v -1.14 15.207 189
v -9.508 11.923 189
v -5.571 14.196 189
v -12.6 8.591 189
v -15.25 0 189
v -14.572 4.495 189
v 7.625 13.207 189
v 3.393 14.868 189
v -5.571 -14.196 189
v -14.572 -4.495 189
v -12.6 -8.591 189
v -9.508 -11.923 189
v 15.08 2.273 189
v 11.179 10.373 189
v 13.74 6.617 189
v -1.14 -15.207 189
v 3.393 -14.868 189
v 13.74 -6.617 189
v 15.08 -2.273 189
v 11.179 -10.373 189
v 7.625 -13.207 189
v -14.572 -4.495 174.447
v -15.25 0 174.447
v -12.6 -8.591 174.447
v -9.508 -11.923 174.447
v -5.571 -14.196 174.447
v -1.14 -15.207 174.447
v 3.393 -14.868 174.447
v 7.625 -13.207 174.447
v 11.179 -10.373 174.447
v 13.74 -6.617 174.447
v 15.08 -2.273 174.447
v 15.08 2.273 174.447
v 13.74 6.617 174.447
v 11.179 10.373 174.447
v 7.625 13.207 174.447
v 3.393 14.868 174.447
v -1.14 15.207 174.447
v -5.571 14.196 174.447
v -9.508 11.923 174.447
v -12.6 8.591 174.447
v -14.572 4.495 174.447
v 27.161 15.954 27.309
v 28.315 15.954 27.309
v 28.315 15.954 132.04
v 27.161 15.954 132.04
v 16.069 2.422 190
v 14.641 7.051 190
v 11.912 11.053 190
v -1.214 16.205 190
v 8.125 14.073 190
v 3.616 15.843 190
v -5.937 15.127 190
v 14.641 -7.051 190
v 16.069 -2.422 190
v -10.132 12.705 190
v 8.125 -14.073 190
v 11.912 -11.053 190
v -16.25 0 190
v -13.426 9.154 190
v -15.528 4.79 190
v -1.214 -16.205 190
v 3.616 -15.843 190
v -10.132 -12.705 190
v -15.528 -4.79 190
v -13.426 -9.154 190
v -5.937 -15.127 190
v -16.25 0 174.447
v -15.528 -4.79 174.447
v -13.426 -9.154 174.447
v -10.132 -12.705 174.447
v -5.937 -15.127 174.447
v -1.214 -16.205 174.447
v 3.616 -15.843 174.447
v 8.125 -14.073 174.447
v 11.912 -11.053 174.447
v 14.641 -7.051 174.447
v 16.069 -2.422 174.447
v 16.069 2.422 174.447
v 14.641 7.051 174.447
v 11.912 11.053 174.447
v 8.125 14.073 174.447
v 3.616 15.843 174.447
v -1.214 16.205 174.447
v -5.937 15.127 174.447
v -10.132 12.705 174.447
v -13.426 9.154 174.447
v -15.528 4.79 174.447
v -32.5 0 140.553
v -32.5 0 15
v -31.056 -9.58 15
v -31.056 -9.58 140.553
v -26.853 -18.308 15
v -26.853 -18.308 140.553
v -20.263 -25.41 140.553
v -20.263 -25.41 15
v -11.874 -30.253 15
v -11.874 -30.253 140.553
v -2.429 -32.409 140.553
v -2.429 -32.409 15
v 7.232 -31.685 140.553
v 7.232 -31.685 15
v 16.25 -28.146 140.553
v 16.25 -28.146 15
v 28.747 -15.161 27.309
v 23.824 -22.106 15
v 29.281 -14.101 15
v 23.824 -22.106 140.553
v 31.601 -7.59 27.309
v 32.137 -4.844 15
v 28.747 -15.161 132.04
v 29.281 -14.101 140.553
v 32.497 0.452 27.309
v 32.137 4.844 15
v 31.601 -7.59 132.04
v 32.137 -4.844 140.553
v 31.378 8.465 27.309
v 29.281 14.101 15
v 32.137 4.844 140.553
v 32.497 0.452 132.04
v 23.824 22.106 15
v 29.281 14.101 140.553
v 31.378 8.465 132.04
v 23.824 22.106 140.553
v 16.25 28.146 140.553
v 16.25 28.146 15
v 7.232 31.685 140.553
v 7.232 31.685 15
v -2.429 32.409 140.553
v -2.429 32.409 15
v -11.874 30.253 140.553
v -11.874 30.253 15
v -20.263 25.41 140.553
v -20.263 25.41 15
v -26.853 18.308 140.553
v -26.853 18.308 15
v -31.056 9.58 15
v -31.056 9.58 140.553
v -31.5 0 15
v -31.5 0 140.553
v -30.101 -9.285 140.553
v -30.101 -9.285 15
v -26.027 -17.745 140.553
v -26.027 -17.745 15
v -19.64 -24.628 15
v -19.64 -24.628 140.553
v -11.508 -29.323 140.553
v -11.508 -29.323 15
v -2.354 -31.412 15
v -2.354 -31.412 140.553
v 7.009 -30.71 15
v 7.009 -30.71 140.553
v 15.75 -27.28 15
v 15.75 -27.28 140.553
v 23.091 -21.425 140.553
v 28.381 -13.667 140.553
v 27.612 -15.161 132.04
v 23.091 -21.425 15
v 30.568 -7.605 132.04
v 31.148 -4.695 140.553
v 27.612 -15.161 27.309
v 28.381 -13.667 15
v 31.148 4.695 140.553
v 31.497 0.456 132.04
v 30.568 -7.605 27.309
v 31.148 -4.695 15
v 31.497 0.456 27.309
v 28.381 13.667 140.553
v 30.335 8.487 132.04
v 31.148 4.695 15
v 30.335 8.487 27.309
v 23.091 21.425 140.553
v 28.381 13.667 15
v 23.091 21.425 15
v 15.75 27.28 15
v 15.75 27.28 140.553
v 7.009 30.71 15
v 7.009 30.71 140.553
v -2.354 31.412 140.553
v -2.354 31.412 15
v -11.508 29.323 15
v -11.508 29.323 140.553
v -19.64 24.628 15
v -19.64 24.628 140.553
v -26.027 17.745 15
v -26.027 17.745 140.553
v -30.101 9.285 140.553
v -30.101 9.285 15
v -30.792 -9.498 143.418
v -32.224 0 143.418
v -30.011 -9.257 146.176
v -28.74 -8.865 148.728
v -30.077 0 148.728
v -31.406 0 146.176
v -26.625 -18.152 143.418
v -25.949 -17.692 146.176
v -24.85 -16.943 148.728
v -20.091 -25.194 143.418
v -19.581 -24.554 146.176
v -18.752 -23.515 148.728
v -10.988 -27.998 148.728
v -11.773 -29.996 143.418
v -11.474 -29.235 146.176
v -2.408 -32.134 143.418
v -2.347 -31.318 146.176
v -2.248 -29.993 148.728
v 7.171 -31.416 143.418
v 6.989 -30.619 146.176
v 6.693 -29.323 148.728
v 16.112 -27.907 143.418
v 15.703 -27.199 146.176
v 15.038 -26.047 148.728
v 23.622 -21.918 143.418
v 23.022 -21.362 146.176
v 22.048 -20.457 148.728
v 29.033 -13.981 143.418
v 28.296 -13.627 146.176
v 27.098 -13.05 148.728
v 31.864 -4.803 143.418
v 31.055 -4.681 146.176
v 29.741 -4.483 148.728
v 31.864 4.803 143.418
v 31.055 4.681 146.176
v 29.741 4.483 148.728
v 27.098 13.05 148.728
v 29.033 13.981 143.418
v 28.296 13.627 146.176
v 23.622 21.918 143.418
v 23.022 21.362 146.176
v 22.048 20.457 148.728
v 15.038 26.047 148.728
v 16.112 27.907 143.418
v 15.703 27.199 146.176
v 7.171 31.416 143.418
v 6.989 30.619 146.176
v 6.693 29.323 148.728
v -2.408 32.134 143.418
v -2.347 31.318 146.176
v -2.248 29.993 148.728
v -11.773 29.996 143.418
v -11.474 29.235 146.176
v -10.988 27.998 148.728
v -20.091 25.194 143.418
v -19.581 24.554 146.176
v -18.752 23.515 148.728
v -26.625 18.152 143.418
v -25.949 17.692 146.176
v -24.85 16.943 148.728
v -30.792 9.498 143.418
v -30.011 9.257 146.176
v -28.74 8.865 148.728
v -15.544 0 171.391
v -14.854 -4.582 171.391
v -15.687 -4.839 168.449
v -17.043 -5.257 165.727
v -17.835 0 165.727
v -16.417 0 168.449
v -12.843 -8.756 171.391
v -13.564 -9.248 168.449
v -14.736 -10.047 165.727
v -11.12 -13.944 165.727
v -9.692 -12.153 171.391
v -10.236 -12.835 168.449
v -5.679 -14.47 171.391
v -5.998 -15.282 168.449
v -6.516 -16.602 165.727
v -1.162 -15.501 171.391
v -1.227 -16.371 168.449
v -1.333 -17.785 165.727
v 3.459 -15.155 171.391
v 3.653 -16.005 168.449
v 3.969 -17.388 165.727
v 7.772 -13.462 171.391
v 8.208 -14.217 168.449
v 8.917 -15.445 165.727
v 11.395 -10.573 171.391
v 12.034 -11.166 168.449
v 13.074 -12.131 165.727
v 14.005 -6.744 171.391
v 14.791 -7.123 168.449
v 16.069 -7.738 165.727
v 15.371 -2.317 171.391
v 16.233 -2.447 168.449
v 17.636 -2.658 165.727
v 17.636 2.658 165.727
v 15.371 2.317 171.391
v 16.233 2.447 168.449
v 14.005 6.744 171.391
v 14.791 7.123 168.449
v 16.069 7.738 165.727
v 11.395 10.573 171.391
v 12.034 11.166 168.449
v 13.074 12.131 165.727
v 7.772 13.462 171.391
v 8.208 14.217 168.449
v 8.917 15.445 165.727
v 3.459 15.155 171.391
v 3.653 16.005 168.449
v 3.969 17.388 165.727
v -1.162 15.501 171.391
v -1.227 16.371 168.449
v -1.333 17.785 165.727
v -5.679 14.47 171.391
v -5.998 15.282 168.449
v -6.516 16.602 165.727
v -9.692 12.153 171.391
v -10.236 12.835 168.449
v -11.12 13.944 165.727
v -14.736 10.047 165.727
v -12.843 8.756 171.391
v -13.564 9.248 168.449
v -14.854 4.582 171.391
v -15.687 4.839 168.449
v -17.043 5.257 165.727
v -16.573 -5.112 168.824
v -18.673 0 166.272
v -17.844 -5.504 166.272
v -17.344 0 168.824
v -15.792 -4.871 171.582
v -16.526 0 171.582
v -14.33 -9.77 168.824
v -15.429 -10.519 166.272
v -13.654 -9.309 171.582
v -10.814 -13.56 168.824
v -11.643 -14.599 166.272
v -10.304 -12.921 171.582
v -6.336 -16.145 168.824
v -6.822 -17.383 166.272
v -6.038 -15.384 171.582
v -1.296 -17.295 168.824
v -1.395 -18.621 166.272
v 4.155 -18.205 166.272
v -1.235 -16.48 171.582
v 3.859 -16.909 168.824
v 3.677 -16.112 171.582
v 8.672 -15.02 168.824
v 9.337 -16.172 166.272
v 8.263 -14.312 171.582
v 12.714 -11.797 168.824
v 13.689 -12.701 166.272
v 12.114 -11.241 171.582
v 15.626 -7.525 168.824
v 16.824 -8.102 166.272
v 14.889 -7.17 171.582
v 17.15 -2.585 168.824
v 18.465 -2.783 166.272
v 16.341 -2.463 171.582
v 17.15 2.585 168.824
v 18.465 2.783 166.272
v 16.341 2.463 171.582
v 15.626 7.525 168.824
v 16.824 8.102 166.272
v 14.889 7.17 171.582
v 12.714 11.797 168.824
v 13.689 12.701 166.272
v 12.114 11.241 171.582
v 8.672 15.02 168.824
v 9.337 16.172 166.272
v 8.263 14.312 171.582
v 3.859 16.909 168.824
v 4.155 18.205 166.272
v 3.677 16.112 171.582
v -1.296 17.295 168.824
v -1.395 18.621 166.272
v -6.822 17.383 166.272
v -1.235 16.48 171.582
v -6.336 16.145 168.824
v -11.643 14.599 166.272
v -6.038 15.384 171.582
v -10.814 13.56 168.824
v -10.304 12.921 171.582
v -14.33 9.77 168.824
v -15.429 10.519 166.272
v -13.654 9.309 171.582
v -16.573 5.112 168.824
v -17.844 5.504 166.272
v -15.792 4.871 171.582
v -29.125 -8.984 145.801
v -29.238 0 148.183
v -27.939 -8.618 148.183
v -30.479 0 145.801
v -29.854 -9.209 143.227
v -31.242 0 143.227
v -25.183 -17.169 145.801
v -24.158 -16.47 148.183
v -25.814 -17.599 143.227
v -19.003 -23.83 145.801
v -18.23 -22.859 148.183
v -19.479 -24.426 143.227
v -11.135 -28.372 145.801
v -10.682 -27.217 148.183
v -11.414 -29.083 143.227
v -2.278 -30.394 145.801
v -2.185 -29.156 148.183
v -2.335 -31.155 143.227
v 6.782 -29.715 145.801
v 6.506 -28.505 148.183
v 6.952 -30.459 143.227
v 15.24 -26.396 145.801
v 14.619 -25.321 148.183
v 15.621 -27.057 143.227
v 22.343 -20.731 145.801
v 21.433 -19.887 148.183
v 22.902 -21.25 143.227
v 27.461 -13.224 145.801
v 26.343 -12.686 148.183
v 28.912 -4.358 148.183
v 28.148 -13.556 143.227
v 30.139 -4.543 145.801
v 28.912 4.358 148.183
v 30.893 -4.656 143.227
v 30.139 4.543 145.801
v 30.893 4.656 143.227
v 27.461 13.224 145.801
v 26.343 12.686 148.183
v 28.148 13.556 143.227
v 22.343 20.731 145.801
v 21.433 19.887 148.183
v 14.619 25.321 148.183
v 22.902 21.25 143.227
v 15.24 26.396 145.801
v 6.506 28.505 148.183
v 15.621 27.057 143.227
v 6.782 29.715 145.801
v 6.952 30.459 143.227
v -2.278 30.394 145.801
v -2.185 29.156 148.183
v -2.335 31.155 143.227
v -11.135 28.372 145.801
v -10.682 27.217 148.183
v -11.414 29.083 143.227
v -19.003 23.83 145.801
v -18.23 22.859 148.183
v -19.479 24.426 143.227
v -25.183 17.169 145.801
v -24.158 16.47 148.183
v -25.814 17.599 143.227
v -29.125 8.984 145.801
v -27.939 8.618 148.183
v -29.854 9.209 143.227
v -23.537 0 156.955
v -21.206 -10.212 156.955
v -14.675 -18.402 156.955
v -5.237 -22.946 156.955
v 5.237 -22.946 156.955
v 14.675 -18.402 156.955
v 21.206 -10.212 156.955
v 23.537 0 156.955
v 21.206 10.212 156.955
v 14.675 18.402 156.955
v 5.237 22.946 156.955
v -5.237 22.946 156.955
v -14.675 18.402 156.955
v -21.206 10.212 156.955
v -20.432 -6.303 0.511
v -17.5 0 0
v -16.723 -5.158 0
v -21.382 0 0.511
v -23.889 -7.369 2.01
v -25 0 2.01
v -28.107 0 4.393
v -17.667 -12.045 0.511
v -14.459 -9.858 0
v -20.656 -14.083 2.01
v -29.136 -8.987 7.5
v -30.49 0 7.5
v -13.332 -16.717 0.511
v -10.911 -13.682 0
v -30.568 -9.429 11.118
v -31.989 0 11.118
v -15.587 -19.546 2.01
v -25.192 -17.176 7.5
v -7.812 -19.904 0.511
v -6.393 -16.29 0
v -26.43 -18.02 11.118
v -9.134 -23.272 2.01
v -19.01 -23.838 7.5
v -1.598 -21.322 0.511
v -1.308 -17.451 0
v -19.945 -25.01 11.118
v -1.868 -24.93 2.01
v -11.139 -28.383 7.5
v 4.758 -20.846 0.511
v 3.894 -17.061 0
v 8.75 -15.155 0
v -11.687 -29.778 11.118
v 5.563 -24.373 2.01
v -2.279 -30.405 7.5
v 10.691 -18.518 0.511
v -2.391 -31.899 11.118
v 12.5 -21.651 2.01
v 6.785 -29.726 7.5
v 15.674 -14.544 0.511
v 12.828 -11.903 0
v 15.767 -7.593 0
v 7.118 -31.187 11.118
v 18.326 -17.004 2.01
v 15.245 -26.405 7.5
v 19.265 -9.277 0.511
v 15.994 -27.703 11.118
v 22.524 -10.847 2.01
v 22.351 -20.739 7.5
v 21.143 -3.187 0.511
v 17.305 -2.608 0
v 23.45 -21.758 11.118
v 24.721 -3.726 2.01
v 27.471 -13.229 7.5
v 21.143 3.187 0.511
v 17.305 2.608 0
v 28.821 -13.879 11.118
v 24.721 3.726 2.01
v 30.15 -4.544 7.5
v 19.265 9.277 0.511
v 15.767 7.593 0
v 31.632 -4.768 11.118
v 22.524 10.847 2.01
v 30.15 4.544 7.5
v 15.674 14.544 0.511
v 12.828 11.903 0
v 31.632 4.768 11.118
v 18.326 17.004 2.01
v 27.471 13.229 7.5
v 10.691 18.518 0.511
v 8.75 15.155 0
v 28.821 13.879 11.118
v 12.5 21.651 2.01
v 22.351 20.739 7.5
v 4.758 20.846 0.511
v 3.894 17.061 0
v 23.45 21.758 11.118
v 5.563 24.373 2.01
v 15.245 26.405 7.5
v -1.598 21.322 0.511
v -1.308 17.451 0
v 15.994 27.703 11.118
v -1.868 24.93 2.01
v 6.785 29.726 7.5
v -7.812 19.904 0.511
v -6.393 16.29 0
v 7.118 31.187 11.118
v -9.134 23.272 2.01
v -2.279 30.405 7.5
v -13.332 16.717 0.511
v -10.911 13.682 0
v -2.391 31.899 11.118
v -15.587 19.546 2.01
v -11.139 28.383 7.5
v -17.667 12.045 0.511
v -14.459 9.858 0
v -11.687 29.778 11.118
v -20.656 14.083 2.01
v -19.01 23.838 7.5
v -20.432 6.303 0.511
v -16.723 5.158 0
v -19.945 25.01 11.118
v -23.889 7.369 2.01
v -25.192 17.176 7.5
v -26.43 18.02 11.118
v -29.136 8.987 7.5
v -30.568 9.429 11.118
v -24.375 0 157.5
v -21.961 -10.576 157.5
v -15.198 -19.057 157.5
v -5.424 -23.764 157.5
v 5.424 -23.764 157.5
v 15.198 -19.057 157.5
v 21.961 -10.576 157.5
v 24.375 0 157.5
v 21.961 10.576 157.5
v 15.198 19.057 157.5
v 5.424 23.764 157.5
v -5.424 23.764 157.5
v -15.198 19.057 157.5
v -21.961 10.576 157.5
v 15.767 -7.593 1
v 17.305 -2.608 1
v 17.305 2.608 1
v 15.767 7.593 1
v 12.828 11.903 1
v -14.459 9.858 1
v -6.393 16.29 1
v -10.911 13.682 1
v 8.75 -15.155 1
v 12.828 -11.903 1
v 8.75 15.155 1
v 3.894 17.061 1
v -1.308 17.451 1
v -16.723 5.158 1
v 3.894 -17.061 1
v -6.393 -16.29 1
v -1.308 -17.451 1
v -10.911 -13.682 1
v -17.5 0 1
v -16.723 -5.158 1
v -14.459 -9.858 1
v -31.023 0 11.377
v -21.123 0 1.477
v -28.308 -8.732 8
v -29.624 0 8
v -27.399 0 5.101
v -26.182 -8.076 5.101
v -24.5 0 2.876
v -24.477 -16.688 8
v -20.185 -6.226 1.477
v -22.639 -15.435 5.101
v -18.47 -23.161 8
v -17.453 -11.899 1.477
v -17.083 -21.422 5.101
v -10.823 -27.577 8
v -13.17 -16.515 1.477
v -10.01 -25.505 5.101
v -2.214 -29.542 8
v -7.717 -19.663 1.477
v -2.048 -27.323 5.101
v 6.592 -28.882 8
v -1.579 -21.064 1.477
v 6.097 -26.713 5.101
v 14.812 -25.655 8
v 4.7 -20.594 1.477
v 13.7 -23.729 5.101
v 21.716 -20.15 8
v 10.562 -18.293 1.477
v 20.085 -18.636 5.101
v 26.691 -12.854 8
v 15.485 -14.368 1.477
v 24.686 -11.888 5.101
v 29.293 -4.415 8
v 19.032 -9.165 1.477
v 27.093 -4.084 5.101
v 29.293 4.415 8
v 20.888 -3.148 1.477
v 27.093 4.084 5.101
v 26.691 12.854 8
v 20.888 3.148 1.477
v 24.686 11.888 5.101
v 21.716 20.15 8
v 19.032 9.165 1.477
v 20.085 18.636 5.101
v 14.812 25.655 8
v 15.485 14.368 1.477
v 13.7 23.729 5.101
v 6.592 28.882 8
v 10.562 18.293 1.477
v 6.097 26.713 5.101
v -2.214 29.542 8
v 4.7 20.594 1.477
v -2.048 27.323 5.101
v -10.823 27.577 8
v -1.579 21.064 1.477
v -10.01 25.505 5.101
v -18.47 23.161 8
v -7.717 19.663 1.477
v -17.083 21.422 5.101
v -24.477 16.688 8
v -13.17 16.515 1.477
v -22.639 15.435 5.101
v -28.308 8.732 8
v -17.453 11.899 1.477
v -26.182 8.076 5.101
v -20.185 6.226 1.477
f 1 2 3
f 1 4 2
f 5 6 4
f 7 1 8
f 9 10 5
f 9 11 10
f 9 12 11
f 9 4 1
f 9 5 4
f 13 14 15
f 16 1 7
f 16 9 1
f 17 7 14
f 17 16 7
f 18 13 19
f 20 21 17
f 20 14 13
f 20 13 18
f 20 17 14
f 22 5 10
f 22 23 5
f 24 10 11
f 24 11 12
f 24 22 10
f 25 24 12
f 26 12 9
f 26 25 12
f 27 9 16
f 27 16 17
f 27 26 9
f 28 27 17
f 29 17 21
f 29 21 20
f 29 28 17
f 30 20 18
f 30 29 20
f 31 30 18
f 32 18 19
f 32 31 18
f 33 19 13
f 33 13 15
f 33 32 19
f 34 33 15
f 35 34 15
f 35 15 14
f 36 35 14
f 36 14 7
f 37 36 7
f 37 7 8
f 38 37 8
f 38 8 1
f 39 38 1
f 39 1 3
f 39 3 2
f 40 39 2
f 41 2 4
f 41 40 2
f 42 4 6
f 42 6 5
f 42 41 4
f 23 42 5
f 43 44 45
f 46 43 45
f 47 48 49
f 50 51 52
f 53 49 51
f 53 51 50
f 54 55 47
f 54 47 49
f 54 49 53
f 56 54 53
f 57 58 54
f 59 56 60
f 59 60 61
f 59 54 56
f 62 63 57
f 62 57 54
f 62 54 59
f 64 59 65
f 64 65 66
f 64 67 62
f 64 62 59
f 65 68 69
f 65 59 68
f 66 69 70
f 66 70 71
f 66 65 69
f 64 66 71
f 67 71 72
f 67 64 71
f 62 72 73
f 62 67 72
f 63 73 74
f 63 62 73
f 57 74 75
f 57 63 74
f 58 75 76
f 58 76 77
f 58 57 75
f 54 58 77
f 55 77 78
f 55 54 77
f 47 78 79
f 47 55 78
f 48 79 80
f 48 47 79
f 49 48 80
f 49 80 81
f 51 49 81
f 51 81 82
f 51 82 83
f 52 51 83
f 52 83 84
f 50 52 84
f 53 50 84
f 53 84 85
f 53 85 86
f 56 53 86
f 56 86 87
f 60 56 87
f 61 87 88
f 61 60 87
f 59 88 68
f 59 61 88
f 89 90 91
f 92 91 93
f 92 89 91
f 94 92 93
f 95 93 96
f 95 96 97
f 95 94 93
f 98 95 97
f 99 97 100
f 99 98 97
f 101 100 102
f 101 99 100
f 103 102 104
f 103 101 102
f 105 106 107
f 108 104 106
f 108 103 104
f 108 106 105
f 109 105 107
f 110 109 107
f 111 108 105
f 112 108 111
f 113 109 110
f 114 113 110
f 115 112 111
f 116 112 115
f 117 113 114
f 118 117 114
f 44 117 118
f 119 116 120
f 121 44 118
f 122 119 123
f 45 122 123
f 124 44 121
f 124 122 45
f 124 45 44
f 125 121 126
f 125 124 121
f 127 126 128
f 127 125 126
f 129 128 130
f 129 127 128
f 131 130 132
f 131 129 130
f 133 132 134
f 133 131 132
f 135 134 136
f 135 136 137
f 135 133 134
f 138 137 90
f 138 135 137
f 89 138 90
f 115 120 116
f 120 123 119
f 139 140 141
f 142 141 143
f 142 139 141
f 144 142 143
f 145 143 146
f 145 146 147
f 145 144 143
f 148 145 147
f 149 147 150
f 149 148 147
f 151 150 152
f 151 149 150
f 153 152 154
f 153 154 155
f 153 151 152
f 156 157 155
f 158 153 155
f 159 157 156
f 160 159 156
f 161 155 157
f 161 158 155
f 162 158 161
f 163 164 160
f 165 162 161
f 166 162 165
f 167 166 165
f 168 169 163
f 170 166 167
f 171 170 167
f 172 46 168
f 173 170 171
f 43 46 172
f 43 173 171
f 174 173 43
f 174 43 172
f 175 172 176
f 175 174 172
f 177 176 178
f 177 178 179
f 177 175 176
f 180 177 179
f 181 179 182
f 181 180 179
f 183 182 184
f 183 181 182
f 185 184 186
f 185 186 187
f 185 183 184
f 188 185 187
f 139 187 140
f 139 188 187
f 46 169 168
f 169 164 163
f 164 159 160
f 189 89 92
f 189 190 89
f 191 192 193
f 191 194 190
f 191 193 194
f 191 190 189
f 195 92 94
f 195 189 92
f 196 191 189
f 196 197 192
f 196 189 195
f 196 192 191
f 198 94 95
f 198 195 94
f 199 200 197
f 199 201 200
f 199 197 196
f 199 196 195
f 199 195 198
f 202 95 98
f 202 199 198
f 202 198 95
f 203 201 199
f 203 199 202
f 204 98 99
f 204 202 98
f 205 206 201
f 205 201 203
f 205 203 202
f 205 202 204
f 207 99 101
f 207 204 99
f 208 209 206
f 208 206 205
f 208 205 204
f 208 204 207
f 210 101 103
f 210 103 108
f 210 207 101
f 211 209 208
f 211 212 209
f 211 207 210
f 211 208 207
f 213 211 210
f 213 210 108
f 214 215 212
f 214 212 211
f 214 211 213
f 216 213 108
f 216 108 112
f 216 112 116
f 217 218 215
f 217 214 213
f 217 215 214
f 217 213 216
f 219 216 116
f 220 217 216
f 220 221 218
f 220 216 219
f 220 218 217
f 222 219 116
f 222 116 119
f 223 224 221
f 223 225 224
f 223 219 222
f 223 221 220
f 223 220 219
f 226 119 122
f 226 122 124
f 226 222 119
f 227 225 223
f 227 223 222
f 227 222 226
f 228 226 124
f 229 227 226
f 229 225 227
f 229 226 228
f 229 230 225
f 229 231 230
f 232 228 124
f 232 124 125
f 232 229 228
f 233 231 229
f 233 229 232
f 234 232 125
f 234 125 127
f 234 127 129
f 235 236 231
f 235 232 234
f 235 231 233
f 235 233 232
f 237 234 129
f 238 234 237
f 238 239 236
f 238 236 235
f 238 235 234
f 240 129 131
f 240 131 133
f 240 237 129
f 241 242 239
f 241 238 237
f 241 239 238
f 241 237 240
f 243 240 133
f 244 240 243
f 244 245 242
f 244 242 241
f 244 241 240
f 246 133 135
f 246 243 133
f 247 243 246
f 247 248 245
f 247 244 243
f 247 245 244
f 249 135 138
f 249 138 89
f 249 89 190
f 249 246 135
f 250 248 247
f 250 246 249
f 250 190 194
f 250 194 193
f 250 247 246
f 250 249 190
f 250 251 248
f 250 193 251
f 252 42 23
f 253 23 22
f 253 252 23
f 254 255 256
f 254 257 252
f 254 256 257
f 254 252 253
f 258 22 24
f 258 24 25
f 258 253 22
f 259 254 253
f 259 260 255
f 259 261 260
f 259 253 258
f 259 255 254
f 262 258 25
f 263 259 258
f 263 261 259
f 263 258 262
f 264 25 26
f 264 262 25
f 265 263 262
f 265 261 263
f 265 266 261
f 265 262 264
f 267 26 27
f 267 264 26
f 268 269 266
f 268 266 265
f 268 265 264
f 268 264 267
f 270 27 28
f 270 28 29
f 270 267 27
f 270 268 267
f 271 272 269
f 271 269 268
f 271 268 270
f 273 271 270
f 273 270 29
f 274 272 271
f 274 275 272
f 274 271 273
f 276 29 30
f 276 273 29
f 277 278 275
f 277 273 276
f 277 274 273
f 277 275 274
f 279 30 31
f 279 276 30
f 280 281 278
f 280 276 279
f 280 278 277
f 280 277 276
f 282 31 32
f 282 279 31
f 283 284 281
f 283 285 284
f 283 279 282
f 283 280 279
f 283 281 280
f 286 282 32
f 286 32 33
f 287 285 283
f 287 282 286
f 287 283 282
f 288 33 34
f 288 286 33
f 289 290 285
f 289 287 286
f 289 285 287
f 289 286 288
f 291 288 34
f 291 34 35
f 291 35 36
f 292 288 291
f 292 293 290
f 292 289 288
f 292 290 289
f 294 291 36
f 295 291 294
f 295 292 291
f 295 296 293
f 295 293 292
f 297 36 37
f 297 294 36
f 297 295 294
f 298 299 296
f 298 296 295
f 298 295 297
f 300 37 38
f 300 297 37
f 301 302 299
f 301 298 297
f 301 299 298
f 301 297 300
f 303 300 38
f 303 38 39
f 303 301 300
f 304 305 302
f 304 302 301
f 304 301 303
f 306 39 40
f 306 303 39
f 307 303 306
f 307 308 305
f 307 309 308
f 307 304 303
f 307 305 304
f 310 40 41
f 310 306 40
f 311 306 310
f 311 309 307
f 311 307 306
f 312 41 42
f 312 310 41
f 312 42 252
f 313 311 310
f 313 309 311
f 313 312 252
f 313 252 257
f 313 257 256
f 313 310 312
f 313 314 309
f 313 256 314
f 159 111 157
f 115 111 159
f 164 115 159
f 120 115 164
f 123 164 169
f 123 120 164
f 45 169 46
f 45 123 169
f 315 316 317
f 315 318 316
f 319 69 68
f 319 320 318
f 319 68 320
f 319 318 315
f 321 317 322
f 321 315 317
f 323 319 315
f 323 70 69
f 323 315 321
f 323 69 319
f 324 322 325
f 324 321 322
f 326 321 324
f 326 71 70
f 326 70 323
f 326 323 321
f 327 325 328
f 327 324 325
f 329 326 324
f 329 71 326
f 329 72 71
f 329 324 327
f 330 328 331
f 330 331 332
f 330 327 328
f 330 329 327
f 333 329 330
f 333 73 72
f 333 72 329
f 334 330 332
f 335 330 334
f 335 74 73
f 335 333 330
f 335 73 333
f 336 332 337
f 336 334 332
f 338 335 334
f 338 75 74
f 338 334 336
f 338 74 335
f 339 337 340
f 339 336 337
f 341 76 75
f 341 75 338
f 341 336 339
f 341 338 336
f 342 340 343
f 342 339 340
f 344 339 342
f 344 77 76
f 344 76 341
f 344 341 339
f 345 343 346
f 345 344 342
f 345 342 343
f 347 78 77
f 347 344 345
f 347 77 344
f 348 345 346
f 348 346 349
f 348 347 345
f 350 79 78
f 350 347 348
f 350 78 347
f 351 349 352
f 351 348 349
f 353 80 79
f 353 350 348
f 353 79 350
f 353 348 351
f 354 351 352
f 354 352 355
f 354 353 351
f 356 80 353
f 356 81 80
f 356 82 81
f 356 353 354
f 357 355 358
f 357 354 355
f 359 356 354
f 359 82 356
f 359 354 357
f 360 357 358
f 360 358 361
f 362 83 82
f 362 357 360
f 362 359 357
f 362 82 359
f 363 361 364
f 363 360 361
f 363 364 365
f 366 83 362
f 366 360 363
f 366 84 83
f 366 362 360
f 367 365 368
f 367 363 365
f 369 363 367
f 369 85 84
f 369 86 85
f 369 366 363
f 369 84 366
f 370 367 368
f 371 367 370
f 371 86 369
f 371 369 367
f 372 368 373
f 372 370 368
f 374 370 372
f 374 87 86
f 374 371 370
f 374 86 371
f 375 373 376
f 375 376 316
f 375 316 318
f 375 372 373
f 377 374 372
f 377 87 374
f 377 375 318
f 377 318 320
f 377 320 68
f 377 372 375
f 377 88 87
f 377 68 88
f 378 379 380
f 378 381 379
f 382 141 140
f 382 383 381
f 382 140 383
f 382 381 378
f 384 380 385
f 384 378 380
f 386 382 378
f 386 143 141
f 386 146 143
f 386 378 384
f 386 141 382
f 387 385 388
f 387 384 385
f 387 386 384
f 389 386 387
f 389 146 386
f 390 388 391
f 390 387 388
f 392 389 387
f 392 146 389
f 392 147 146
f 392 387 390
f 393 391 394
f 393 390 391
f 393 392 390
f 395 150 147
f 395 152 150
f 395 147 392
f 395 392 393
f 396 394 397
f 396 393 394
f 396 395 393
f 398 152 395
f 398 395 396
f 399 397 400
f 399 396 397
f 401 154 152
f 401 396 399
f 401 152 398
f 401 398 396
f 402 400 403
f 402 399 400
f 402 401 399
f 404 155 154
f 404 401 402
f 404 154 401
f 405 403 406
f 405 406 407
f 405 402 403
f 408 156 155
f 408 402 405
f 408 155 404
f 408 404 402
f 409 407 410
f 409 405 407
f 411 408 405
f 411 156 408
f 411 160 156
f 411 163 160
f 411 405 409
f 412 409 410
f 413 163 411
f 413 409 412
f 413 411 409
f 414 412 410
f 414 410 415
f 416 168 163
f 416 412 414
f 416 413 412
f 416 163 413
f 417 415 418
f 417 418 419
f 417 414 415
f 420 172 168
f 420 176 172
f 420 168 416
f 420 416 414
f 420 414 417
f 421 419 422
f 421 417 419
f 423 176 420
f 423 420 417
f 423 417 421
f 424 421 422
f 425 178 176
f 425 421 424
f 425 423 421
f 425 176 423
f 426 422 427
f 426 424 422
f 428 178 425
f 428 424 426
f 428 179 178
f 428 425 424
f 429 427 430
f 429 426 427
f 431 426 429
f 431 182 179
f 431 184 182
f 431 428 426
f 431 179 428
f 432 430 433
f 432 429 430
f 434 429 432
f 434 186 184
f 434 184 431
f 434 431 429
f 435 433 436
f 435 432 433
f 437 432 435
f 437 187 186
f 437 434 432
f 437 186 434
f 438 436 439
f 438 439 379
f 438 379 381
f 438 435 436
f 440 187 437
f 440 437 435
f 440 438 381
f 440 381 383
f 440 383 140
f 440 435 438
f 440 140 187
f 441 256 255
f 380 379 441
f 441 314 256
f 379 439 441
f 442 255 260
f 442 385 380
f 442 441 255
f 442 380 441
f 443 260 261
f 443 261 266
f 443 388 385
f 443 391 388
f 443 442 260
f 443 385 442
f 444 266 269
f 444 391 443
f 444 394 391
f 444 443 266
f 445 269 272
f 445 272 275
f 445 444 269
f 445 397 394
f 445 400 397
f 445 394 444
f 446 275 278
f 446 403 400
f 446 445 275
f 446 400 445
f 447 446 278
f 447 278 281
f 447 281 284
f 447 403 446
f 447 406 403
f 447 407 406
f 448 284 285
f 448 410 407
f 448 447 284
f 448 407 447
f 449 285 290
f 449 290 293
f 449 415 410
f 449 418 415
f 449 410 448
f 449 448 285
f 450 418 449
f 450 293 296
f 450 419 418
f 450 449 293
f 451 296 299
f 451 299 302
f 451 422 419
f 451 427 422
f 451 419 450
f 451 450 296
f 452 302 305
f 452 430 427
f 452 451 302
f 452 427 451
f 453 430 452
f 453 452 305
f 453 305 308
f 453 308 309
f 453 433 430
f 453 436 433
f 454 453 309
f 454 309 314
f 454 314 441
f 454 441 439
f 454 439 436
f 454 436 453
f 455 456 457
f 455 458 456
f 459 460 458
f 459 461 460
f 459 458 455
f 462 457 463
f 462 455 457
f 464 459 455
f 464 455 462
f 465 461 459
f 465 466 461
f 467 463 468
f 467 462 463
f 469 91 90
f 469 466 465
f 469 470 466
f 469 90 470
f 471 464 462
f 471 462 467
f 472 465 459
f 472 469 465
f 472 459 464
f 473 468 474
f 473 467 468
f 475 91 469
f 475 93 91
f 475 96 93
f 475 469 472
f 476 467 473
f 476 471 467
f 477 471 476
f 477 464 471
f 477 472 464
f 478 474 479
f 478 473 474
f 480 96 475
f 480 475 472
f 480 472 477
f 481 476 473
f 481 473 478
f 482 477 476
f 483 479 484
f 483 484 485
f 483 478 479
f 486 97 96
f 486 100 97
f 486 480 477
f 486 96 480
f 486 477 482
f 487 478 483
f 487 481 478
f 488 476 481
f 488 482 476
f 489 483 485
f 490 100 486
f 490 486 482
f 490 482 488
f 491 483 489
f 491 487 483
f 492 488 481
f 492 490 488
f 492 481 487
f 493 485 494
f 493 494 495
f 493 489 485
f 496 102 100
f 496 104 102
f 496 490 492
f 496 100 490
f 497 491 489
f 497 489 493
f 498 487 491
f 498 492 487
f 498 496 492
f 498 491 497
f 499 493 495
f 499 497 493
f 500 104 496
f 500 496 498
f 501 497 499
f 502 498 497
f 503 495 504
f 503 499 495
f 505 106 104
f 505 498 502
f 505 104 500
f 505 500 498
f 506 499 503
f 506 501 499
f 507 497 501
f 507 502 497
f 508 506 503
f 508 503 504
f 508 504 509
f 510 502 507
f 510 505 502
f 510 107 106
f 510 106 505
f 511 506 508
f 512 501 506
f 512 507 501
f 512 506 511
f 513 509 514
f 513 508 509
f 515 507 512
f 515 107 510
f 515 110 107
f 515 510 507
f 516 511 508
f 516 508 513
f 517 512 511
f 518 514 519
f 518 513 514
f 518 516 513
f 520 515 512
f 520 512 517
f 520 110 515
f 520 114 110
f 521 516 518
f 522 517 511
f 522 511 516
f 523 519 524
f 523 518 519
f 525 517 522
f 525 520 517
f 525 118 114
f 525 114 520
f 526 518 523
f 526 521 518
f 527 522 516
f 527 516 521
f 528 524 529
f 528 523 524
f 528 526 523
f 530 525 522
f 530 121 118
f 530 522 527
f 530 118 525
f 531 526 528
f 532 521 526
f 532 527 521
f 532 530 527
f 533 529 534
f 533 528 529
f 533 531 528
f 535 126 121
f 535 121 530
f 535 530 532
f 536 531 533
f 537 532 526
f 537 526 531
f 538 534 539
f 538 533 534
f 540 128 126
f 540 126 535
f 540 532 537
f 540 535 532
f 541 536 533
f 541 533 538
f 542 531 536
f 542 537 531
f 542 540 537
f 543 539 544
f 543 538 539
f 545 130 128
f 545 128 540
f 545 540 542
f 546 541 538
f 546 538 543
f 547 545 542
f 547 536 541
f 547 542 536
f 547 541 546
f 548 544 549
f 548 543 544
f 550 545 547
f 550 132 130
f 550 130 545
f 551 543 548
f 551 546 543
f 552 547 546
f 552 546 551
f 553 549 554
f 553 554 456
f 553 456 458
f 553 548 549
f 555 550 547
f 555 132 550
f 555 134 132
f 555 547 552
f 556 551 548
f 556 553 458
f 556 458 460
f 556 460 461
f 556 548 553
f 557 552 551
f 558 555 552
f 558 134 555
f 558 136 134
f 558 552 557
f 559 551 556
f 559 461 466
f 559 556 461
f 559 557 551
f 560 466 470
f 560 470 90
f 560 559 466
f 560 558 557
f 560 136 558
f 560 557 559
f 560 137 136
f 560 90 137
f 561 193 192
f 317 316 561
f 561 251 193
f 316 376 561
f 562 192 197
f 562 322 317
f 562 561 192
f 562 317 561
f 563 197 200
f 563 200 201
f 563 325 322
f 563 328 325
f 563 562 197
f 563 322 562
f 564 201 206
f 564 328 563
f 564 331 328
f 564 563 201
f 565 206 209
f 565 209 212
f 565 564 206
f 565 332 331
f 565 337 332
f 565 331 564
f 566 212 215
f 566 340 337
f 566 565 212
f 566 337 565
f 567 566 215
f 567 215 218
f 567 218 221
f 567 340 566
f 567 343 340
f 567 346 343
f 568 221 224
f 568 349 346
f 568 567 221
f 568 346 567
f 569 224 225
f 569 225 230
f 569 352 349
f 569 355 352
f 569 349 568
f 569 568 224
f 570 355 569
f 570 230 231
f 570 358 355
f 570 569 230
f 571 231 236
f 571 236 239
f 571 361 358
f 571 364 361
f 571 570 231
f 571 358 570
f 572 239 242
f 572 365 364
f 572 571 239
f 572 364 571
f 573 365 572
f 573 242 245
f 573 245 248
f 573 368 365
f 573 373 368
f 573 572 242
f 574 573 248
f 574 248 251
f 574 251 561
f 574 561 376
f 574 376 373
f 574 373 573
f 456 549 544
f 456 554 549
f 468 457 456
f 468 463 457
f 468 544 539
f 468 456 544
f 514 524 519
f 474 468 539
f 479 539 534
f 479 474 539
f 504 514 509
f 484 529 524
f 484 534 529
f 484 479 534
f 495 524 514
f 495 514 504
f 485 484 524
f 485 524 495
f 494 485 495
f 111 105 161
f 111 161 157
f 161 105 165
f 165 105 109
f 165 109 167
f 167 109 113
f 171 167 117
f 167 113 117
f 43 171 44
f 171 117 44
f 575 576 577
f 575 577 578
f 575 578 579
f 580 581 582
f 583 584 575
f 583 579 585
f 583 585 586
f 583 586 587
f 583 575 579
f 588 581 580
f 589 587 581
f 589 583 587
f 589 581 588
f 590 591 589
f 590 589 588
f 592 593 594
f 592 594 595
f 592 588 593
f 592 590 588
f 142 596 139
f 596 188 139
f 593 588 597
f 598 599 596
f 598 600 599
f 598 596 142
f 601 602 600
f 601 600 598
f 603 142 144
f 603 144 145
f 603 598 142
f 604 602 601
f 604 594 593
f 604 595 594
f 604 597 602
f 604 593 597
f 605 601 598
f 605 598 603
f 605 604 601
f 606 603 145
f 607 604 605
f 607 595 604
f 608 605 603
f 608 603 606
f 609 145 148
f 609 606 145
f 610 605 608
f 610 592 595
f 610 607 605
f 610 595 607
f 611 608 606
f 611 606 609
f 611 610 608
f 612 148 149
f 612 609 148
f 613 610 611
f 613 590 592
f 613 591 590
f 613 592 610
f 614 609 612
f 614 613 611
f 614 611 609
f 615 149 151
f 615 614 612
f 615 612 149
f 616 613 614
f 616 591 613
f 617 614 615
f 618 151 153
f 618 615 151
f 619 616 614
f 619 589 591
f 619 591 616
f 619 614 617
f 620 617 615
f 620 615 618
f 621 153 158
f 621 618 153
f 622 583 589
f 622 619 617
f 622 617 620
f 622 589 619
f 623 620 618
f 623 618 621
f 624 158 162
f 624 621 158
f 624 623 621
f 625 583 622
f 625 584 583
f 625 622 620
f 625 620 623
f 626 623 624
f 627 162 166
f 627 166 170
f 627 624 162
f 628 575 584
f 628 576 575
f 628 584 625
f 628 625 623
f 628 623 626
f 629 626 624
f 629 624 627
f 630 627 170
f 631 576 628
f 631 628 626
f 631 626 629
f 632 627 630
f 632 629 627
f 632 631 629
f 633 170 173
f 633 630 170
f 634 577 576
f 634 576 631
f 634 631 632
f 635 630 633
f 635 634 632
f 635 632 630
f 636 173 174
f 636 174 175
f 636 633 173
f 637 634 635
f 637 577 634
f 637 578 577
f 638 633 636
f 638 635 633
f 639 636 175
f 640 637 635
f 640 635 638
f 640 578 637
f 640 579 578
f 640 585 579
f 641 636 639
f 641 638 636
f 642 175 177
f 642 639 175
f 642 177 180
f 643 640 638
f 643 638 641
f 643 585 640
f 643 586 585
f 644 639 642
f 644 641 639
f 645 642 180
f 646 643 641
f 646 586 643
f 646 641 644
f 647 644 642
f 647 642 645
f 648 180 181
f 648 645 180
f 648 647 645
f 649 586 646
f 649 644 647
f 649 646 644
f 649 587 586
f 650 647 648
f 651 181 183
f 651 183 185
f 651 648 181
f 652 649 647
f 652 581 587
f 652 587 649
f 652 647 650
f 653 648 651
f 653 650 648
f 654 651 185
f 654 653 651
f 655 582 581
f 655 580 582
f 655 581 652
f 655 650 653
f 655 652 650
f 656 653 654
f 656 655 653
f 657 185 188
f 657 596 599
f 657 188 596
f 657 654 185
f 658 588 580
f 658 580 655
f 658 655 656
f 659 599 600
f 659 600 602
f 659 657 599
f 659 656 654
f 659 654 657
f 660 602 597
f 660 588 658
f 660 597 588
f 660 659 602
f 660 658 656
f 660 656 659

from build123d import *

# Parameters (mm, degrees)
SKETCH2_W          = 31.114715918
SKETCH2_H          = 104.73171331
CUT_EXTRUDE1_DEPTH = 48


with BuildPart() as part:
    # Sketch1 → Revolve1 (revolve)
    with BuildSketch(Plane.YZ, mode=Mode.PRIVATE) as revolve1_sk:
        with BuildLine():
            Line((0, 0), (17.5, 0))
            ThreePointArc((17.5, 0), (28.106601718, 4.393398282), (32.5, 15))
            Line((32.5, 15), (32.5, 140.55339898))
            ThreePointArc((32.5, 140.55339898), (31.881408374, 144.816624656), (30.076654245, 148.728224239))
            Line((30.076654245, 148.728224239), (18.673345755, 166.271775761))
            ThreePointArc((18.673345755, 166.271775761), (16.868591626, 170.183375344), (16.25, 174.44660102))
            Line((16.25, 174.44660102), (16.25, 190))
            Line((16.25, 190), (0, 190))
            Line((0, 190), (0, 189))
            Line((0, 189), (15.25, 189))
            Line((15.25, 189), (15.25, 174.44660102))
            ThreePointArc((15.25, 174.44660102), (15.909831067, 169.899160298), (17.834902139, 165.72678741))
            Line((17.834902139, 165.72678741), (29.238210628, 148.183235889))
            ThreePointArc((29.238210628, 148.183235889), (30.922647816, 144.532409611), (31.5, 140.55339898))
            Line((31.5, 140.55339898), (31.5, 15))
            ThreePointArc((31.5, 15), (27.399494937, 5.100505063), (17.5, 1))
            Line((17.5, 1), (0, 1))
            Line((0, 1), (0, 0))
        make_face()
    revolve(revolve1_sk.sketch.rotate(Axis((0, 0, 0), (0, 0, 1)), 90), axis=Axis((0, 0, 0), (0, 0, 1)))

    # Sketch2 → Cut-Extrude1 (cut)
    with BuildSketch(Plane.YZ.offset(60)):
        with Locations((0.396690762, 79.674592023)):
            Rectangle(SKETCH2_W, SKETCH2_H)
    extrude(amount=-CUT_EXTRUDE1_DEPTH, mode=Mode.SUBTRACT)


solid = part.part
